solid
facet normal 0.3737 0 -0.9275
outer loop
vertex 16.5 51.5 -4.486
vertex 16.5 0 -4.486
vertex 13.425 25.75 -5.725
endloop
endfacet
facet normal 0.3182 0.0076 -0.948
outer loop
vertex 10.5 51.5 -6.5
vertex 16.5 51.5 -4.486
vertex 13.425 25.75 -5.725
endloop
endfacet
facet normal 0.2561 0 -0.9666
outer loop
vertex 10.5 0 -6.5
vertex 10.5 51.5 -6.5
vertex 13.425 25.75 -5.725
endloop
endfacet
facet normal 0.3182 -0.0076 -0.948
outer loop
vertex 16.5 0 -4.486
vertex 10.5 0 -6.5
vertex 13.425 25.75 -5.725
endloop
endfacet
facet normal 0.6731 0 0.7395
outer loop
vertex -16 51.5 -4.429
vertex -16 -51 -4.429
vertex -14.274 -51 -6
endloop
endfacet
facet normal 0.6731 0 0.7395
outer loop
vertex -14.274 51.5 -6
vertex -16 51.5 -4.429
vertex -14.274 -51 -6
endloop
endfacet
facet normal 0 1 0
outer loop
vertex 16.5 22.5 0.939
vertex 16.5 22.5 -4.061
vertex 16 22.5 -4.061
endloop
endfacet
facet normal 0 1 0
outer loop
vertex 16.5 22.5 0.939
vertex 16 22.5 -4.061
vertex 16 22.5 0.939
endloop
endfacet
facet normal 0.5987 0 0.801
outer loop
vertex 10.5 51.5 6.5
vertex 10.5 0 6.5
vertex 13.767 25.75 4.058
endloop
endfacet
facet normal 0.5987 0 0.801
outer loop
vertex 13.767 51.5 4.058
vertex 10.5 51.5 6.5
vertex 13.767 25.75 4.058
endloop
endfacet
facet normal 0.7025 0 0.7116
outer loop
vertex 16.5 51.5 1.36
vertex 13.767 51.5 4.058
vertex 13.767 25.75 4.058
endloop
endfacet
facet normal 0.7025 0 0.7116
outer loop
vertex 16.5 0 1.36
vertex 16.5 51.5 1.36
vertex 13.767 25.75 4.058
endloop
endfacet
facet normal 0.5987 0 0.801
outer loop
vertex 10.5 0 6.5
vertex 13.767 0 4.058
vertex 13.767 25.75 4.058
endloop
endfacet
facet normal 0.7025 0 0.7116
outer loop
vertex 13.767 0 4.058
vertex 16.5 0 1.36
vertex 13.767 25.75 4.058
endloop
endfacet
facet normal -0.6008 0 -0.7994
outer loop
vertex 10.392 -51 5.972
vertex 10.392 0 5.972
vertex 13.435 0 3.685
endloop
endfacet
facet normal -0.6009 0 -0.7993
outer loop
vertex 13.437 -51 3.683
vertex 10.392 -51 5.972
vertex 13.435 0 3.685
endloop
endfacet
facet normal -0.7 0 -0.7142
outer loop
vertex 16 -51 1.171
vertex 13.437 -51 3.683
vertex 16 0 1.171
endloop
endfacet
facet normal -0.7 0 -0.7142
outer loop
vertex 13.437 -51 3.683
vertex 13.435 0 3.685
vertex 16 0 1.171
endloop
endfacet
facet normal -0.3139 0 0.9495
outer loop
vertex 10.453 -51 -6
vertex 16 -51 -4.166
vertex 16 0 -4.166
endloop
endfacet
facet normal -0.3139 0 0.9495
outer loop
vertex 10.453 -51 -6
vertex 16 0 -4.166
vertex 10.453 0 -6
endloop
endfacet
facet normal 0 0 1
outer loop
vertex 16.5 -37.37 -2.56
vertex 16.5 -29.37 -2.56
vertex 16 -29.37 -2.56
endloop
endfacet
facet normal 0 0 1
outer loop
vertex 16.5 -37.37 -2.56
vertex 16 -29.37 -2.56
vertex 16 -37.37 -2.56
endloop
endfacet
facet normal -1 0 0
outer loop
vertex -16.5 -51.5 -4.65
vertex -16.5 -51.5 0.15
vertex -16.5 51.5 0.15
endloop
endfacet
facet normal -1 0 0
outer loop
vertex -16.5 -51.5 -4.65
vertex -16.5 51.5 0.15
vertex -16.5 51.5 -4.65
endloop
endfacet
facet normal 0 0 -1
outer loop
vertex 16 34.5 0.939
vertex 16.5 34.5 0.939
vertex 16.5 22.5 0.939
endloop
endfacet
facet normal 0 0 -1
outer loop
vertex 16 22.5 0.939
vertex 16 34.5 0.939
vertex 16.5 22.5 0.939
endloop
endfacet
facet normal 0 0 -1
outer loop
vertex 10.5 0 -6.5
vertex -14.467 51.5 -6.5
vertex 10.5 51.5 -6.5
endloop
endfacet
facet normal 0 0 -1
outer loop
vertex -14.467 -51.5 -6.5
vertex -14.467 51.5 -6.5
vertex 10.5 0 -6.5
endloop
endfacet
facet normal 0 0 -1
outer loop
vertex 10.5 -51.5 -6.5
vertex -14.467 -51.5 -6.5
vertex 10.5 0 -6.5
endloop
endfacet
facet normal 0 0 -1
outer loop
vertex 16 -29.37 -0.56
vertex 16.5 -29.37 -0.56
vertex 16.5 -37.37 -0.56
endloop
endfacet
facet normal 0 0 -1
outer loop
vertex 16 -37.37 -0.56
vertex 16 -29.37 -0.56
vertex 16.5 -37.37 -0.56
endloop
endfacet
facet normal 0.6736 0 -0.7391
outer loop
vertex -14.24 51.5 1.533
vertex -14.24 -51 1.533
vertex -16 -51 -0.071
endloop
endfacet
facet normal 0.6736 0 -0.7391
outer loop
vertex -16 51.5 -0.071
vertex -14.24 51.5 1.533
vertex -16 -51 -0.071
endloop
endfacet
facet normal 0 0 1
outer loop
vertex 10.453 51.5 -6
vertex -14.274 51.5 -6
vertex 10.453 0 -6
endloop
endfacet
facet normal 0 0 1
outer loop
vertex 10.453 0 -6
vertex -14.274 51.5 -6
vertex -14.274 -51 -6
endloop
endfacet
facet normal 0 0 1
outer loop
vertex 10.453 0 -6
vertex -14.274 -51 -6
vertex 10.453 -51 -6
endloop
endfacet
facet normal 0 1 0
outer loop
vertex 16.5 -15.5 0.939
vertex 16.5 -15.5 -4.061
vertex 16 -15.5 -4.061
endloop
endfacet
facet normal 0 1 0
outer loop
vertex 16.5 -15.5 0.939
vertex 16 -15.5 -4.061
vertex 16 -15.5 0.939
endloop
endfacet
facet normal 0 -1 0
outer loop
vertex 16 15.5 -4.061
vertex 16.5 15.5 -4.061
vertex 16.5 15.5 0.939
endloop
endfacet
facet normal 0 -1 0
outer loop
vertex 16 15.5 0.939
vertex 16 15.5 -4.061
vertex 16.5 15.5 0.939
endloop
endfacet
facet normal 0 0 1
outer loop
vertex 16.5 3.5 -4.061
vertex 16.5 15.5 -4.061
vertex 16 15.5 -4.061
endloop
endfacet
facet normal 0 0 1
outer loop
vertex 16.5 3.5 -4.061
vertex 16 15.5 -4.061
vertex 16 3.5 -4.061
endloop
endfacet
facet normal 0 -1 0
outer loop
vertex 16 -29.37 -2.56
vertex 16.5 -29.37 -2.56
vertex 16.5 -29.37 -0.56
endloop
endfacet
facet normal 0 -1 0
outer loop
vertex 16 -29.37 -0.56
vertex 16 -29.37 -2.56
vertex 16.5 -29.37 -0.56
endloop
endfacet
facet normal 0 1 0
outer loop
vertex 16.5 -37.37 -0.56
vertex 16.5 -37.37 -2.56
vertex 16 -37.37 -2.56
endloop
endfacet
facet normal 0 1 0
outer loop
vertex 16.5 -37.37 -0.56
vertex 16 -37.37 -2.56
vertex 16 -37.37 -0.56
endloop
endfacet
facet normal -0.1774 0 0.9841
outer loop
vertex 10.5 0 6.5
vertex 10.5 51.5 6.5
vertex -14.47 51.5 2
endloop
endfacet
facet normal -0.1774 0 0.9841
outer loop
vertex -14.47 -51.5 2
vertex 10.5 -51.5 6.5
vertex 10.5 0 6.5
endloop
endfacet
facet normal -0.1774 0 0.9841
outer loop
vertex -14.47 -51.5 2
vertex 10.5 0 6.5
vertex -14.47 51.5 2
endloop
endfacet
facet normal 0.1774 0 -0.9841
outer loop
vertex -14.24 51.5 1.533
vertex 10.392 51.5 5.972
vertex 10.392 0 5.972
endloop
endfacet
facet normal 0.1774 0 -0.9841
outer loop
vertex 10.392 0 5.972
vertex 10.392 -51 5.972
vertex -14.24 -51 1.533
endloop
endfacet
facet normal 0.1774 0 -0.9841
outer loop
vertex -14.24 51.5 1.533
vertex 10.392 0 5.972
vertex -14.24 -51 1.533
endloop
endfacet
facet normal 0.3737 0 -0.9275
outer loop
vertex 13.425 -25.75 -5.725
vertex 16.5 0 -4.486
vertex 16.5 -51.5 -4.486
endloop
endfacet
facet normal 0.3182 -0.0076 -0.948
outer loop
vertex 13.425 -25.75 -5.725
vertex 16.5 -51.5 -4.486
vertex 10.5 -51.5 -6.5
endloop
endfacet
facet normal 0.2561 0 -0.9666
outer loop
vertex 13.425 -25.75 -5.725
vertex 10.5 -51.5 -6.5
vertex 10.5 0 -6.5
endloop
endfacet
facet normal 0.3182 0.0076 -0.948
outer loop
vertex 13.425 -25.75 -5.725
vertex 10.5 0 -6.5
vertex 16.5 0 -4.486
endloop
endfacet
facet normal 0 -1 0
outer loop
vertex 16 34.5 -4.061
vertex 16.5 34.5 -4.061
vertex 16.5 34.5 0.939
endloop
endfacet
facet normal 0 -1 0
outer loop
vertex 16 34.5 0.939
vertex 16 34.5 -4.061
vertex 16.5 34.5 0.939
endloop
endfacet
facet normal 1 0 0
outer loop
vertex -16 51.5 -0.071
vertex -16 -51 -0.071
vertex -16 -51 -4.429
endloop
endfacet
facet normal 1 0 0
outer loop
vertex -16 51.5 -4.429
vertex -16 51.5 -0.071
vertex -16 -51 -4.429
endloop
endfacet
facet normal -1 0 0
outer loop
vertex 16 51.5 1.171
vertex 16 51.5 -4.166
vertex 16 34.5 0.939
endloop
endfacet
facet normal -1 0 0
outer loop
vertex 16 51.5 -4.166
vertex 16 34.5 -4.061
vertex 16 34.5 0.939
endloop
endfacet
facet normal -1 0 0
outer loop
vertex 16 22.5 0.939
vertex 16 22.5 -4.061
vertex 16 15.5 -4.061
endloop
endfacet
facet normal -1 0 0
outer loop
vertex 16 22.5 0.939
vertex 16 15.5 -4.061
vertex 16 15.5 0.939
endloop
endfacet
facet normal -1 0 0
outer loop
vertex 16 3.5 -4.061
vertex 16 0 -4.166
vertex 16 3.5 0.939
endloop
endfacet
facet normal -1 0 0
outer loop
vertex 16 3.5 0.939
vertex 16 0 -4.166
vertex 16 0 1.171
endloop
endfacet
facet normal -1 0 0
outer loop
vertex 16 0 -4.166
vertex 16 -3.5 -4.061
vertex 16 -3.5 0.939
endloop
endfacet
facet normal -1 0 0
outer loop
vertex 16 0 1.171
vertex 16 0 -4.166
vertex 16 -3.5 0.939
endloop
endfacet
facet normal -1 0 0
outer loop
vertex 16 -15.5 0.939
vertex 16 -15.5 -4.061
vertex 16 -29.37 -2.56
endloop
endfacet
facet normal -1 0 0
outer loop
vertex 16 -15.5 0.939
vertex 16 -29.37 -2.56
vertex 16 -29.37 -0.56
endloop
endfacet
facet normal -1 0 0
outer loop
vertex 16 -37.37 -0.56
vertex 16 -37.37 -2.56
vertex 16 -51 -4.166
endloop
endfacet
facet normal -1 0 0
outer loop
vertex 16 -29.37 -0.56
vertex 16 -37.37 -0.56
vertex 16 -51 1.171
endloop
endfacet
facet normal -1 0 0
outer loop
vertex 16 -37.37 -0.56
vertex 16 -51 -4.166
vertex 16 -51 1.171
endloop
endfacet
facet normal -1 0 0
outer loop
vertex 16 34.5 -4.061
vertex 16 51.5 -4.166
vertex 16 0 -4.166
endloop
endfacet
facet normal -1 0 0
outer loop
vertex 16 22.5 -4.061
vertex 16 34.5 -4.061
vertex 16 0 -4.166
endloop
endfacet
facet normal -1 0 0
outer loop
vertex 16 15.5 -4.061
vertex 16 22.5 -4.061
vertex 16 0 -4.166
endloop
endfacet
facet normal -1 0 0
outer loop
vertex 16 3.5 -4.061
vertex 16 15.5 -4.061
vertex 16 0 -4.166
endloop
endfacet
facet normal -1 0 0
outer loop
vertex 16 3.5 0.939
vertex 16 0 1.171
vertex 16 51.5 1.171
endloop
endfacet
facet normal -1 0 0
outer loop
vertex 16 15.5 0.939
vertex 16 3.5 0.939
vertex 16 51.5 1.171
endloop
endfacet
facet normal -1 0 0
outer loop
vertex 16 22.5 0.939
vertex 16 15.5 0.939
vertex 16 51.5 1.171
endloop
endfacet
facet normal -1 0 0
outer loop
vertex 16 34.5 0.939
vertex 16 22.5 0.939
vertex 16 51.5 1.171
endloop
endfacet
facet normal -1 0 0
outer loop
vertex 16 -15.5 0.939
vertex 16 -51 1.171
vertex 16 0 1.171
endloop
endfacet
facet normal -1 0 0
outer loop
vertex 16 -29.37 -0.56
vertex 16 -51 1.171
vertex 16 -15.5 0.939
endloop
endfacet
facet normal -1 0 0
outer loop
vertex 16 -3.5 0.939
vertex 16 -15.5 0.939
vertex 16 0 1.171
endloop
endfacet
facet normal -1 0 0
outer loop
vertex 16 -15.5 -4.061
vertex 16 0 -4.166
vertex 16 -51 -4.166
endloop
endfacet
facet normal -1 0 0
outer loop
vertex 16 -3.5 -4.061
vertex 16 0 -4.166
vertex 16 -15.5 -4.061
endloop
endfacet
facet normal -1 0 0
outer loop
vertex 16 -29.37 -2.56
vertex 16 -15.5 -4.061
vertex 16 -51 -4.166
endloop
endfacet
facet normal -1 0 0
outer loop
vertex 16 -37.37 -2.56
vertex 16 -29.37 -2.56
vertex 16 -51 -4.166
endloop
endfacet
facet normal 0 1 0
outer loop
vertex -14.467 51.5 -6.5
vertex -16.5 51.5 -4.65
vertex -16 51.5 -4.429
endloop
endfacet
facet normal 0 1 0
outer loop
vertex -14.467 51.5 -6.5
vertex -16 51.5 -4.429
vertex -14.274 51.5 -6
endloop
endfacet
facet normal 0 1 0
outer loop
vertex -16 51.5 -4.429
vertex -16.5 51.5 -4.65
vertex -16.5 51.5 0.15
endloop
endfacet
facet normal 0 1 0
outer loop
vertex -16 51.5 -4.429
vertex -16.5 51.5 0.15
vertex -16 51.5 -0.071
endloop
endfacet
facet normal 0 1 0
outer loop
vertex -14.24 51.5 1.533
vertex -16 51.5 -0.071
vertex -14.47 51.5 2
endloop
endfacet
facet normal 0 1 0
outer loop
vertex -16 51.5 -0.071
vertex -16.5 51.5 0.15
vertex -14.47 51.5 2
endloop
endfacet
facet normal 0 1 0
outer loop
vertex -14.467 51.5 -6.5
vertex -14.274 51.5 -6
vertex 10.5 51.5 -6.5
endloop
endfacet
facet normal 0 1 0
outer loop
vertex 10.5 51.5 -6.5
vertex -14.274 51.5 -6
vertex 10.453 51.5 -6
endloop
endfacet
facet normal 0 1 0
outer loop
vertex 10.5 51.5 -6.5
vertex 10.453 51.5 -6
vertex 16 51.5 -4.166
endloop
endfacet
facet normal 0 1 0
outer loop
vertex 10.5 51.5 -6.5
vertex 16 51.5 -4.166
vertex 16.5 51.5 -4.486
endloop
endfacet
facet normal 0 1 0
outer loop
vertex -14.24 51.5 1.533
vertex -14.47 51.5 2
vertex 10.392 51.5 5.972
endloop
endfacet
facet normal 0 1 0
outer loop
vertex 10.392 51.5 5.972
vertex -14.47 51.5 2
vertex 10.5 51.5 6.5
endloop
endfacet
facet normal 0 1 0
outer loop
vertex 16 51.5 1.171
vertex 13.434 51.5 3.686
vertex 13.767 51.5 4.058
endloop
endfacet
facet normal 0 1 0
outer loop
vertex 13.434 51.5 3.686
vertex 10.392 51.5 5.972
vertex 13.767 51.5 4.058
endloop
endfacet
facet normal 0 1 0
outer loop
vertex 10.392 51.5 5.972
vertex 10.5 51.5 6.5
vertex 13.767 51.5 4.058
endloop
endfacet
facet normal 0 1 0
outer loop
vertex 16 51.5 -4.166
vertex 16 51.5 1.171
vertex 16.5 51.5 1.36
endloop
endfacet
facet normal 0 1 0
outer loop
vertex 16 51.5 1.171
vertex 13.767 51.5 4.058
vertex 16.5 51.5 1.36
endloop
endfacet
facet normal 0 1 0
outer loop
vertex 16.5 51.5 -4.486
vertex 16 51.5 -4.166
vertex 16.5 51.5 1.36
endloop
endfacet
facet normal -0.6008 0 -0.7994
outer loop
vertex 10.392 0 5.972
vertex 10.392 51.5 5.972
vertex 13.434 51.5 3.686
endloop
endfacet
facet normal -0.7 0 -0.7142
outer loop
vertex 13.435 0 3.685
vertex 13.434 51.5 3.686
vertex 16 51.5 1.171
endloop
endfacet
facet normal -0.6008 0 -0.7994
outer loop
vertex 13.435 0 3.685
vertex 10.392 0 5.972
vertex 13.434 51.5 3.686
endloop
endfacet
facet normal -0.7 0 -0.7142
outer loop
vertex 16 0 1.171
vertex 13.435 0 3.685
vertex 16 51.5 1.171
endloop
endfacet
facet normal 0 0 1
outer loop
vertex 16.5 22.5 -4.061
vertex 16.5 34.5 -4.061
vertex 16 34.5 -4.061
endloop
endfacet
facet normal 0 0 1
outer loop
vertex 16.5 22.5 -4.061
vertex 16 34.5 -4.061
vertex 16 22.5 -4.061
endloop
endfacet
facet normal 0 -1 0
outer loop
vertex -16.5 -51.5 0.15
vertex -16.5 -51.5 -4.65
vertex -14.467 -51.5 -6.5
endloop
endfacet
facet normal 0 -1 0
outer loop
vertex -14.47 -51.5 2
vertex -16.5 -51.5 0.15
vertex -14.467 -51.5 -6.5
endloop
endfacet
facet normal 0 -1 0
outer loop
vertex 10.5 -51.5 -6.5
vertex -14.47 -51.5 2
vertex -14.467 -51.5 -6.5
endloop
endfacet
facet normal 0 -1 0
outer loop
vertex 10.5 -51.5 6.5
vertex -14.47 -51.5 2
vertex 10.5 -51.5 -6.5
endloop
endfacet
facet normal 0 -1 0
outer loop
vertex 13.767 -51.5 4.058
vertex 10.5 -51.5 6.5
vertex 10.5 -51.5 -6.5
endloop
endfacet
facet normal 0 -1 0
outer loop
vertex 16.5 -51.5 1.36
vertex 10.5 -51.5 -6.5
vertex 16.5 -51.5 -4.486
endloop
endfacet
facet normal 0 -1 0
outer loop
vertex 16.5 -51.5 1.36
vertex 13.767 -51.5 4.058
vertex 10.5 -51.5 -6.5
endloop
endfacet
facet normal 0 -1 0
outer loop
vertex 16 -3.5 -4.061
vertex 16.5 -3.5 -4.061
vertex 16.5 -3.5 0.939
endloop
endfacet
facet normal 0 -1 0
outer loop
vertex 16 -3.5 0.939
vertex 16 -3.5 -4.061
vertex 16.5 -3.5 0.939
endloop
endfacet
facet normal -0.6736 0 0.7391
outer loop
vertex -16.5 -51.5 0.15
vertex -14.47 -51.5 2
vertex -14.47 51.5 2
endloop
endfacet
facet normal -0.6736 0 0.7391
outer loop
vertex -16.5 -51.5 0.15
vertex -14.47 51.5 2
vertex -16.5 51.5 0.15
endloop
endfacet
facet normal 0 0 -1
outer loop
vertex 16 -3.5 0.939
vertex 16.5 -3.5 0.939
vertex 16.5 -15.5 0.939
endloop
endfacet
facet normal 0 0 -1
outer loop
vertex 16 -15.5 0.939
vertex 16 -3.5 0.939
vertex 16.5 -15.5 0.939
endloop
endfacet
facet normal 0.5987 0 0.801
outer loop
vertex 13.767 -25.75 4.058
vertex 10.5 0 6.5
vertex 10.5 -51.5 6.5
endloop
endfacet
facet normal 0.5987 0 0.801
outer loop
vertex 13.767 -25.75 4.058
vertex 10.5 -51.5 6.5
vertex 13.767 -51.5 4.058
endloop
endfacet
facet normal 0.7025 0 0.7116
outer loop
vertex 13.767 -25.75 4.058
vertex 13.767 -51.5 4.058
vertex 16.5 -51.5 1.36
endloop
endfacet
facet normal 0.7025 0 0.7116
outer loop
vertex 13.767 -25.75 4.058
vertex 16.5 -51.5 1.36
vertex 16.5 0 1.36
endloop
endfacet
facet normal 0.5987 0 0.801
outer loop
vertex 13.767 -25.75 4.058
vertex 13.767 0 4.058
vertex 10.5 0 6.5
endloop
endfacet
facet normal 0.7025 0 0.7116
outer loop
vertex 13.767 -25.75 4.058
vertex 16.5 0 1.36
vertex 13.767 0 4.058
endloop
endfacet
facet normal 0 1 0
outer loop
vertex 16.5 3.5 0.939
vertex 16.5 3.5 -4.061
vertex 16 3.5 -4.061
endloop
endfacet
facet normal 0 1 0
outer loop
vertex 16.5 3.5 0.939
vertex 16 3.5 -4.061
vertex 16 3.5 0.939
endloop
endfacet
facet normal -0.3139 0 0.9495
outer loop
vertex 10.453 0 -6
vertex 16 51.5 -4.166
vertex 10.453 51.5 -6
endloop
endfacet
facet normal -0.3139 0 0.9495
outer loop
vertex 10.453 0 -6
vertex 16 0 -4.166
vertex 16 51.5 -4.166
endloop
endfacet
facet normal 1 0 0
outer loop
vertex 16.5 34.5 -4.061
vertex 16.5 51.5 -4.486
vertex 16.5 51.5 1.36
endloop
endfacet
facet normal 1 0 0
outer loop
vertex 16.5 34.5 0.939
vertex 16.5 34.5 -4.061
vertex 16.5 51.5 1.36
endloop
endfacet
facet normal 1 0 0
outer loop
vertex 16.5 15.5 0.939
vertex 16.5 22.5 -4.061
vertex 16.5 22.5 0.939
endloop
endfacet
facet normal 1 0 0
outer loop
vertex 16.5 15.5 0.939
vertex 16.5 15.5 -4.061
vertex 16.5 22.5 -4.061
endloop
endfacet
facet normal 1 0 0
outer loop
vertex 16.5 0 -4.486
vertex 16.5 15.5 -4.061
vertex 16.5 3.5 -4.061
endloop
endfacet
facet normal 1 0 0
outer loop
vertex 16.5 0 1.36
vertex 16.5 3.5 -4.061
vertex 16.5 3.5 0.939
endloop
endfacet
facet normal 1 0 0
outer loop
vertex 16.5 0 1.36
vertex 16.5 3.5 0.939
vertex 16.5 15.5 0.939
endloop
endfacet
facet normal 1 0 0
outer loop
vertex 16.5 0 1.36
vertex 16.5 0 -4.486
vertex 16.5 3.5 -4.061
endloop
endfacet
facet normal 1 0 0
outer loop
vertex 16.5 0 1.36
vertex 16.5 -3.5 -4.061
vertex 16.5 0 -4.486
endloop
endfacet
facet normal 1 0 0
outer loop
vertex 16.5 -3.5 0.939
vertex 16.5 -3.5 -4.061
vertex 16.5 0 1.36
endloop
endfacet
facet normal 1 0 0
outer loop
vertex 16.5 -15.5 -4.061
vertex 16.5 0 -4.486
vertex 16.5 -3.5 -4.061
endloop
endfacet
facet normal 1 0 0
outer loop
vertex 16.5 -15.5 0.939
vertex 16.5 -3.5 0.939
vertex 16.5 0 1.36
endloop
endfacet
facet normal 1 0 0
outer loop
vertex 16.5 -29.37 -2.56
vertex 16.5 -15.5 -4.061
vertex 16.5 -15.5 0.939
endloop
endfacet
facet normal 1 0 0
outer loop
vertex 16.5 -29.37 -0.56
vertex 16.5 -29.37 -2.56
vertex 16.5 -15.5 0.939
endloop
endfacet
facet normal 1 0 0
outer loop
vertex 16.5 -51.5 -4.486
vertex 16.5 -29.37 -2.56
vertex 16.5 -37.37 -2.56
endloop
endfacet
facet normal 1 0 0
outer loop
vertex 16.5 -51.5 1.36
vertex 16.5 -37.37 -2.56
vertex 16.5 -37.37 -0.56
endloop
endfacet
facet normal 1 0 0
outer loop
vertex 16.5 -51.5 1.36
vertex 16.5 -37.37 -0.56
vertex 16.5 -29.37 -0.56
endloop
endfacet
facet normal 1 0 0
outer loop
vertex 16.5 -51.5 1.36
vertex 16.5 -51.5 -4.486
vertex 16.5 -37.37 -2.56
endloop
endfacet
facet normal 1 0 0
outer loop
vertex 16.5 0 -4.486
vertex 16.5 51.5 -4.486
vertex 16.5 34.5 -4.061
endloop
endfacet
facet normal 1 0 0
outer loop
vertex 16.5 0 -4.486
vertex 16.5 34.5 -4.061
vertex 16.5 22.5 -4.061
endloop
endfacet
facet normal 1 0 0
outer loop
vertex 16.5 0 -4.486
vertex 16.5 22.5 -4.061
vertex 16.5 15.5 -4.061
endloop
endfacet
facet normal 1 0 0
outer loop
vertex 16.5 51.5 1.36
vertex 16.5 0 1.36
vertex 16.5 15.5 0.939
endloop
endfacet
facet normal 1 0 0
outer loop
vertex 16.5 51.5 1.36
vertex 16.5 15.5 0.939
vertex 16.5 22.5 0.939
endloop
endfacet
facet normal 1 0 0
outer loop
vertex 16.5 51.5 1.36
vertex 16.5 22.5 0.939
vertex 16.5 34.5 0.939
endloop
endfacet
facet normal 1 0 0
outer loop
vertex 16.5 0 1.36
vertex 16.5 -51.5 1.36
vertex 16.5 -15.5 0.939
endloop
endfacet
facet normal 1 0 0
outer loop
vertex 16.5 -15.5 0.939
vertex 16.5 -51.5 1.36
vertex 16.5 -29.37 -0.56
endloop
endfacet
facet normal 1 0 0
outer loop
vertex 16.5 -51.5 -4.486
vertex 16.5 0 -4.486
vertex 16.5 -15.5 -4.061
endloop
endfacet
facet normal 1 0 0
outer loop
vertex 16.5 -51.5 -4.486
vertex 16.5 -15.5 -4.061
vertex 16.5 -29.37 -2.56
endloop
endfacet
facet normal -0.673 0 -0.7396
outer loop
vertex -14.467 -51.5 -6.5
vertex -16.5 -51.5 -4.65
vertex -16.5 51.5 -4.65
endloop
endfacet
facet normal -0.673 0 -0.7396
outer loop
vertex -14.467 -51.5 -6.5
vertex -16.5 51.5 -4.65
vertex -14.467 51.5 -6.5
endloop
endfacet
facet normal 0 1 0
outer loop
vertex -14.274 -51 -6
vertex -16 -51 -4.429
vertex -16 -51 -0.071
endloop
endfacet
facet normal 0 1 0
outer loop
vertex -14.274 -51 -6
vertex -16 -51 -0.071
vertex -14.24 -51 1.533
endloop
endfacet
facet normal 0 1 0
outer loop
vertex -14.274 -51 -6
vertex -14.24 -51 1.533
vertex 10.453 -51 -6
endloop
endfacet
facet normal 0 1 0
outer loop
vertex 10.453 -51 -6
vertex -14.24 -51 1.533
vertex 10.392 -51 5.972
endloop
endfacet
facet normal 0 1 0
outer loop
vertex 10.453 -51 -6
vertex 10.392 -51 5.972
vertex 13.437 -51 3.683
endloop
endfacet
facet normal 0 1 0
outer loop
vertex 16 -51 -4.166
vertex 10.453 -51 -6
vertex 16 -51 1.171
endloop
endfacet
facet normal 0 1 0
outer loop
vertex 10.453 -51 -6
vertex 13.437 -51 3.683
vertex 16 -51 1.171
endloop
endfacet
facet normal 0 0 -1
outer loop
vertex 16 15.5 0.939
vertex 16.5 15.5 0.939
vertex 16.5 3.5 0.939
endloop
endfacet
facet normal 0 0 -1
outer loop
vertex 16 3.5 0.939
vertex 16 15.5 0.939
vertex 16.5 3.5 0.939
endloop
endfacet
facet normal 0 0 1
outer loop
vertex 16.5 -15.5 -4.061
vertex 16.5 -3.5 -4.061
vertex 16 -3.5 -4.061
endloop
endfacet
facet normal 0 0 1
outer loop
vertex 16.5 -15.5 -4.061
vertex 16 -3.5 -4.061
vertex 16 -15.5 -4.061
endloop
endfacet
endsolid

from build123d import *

# Parameters (mm, degrees)
PAD_DEPTH     = 51.5
THICKNESS_T   = -0.5
SKETCH002_W   = 5
SKETCH002_H   = 12
SKETCH002_W_2 = 2
SKETCH002_H_2 = 8
POCKET_DEPTH  = 5


with BuildPart() as part:
    # Sketch → Pad (new body, symmetric)
    with BuildSketch(Plane.XZ):
        with BuildLine():
            Line((16.5, -4.48614), (16.5, 1.35978))
            add(Edge.make_bspline(
                [(10.5, 6.5), (14.0348, 4.18709), (16.5, 1.35978)],
                knots=[0, 0, 0, 1, 1, 1], degree=2))
            Line((10.5, 6.5), (-14.47, 2))
            Line((-14.47, 2), (-16.5, 0.15))
            Line((-16.5, 0.15), (-16.5, -4.65))
            Line((-16.5, -4.65), (-14.466996, -6.5))
            Line((-14.466996, -6.5), (10.5, -6.5))
            add(Edge.make_bspline(
                [(16.5, -4.48614), (13.35, -5.95741), (10.5, -6.5)],
                knots=[0, 0, 0, 1, 1, 1], degree=2))
        make_face()
    extrude(amount=PAD_DEPTH, both=True)

    # Thickness
    thickness_openings = [part.faces().sort_by_distance(p)[0] for p in [
        (0.779746, 51.5, -1.023703),
    ]]
    offset(amount=THICKNESS_T, openings=thickness_openings, kind=Kind.INTERSECTION)

    # Sketch002 (on Face1 of Pad) → Pocket (cut)
    with BuildSketch(Plane(origin=(16.5, 0, 0), x_dir=(0, 0, 1), z_dir=(1, 0, 0))):
        with Locations((-1.56114, 9.5)):
            Rectangle(SKETCH002_W, SKETCH002_H)
        with Locations((-1.56114, -28.5)):
            Rectangle(SKETCH002_W, SKETCH002_H)
        with Locations((-1.56114, -9.5)):
            Rectangle(SKETCH002_W, SKETCH002_H)
        with Locations((-1.56022, 33.370129)):
            Rectangle(SKETCH002_W_2, SKETCH002_H_2)
    extrude(amount=-POCKET_DEPTH, mode=Mode.SUBTRACT)


solid = part.part
